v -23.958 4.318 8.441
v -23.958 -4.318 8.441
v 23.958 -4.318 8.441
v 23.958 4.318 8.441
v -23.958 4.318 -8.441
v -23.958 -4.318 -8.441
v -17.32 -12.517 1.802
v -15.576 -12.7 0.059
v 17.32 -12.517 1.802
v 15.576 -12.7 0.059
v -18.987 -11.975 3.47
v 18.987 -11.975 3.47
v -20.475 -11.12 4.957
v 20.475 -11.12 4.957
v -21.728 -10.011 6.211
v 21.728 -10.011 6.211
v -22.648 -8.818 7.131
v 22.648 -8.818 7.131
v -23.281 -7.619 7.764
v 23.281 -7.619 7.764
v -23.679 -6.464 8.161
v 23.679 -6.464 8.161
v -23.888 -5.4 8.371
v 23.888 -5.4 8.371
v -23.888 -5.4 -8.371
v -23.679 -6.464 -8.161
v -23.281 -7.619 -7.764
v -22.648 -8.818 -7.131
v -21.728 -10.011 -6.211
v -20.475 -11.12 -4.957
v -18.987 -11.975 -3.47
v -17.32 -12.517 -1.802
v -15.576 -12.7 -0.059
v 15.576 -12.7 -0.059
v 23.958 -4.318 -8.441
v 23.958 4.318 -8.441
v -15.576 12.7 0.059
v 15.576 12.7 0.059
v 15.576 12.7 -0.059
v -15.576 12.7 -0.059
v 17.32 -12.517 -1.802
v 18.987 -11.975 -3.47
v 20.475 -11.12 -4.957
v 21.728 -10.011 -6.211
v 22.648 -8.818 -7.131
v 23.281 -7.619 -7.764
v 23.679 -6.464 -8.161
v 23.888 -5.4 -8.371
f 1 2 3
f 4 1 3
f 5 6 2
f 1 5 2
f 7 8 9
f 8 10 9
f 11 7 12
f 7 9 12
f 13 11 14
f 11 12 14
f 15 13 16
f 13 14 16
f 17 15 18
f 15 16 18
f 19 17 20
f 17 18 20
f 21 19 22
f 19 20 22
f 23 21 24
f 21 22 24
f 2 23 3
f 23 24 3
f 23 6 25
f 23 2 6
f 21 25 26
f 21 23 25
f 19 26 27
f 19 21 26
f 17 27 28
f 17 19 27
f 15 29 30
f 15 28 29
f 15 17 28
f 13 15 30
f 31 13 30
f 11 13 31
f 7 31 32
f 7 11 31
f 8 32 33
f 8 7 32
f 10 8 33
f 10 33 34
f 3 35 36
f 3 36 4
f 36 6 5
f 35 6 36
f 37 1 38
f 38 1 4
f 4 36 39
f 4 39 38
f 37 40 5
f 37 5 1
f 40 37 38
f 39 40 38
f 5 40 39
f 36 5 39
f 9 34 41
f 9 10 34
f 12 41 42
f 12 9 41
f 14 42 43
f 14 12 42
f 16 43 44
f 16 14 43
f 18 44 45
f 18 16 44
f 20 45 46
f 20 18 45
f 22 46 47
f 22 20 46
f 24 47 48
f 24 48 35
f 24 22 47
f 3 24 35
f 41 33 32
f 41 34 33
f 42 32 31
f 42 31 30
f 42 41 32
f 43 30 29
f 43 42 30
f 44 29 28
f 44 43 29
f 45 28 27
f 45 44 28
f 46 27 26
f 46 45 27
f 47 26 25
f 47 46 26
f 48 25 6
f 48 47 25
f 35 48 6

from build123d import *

# Parameters (mm, degrees)
F0_W     = 47.9163888
F0_H     = 16.881729
F1_DEPTH = 12.7
F2_R     = 8.382
F3_SIZE  = 8.382


# Not quite as in the source:
# - a feature names something its author has since deleted; it is built from what else it names


with BuildPart() as f1:
    # F0 (on Front) → F1 (new body, symmetric)
    with BuildSketch(Plane.XZ):
        Rectangle(F0_W, F0_H)
    extrude(amount=F1_DEPTH, both=True)

    # F2
    f2_edges = [f1.edges().sort_by_distance(p)[0] for p in [
        (0, -12.7, 8.440864),
        (0, -12.7, -8.440865),
        (-23.958194, -12.7, 0),
        (23.958194, -12.7, 0),
    ]]
    fillet(f2_edges, radius=F2_R)

    # F3
    f3_edges = [f1.edges().sort_by_distance(p)[0] for p in [
        (0, 12.7, 8.440864),
        (23.958194, 12.7, 0),
        (0, 12.7, -8.440865),
        (-23.958194, 12.7, 0),
    ]]
    chamfer(f3_edges, length=F3_SIZE)


solid = f1.part
